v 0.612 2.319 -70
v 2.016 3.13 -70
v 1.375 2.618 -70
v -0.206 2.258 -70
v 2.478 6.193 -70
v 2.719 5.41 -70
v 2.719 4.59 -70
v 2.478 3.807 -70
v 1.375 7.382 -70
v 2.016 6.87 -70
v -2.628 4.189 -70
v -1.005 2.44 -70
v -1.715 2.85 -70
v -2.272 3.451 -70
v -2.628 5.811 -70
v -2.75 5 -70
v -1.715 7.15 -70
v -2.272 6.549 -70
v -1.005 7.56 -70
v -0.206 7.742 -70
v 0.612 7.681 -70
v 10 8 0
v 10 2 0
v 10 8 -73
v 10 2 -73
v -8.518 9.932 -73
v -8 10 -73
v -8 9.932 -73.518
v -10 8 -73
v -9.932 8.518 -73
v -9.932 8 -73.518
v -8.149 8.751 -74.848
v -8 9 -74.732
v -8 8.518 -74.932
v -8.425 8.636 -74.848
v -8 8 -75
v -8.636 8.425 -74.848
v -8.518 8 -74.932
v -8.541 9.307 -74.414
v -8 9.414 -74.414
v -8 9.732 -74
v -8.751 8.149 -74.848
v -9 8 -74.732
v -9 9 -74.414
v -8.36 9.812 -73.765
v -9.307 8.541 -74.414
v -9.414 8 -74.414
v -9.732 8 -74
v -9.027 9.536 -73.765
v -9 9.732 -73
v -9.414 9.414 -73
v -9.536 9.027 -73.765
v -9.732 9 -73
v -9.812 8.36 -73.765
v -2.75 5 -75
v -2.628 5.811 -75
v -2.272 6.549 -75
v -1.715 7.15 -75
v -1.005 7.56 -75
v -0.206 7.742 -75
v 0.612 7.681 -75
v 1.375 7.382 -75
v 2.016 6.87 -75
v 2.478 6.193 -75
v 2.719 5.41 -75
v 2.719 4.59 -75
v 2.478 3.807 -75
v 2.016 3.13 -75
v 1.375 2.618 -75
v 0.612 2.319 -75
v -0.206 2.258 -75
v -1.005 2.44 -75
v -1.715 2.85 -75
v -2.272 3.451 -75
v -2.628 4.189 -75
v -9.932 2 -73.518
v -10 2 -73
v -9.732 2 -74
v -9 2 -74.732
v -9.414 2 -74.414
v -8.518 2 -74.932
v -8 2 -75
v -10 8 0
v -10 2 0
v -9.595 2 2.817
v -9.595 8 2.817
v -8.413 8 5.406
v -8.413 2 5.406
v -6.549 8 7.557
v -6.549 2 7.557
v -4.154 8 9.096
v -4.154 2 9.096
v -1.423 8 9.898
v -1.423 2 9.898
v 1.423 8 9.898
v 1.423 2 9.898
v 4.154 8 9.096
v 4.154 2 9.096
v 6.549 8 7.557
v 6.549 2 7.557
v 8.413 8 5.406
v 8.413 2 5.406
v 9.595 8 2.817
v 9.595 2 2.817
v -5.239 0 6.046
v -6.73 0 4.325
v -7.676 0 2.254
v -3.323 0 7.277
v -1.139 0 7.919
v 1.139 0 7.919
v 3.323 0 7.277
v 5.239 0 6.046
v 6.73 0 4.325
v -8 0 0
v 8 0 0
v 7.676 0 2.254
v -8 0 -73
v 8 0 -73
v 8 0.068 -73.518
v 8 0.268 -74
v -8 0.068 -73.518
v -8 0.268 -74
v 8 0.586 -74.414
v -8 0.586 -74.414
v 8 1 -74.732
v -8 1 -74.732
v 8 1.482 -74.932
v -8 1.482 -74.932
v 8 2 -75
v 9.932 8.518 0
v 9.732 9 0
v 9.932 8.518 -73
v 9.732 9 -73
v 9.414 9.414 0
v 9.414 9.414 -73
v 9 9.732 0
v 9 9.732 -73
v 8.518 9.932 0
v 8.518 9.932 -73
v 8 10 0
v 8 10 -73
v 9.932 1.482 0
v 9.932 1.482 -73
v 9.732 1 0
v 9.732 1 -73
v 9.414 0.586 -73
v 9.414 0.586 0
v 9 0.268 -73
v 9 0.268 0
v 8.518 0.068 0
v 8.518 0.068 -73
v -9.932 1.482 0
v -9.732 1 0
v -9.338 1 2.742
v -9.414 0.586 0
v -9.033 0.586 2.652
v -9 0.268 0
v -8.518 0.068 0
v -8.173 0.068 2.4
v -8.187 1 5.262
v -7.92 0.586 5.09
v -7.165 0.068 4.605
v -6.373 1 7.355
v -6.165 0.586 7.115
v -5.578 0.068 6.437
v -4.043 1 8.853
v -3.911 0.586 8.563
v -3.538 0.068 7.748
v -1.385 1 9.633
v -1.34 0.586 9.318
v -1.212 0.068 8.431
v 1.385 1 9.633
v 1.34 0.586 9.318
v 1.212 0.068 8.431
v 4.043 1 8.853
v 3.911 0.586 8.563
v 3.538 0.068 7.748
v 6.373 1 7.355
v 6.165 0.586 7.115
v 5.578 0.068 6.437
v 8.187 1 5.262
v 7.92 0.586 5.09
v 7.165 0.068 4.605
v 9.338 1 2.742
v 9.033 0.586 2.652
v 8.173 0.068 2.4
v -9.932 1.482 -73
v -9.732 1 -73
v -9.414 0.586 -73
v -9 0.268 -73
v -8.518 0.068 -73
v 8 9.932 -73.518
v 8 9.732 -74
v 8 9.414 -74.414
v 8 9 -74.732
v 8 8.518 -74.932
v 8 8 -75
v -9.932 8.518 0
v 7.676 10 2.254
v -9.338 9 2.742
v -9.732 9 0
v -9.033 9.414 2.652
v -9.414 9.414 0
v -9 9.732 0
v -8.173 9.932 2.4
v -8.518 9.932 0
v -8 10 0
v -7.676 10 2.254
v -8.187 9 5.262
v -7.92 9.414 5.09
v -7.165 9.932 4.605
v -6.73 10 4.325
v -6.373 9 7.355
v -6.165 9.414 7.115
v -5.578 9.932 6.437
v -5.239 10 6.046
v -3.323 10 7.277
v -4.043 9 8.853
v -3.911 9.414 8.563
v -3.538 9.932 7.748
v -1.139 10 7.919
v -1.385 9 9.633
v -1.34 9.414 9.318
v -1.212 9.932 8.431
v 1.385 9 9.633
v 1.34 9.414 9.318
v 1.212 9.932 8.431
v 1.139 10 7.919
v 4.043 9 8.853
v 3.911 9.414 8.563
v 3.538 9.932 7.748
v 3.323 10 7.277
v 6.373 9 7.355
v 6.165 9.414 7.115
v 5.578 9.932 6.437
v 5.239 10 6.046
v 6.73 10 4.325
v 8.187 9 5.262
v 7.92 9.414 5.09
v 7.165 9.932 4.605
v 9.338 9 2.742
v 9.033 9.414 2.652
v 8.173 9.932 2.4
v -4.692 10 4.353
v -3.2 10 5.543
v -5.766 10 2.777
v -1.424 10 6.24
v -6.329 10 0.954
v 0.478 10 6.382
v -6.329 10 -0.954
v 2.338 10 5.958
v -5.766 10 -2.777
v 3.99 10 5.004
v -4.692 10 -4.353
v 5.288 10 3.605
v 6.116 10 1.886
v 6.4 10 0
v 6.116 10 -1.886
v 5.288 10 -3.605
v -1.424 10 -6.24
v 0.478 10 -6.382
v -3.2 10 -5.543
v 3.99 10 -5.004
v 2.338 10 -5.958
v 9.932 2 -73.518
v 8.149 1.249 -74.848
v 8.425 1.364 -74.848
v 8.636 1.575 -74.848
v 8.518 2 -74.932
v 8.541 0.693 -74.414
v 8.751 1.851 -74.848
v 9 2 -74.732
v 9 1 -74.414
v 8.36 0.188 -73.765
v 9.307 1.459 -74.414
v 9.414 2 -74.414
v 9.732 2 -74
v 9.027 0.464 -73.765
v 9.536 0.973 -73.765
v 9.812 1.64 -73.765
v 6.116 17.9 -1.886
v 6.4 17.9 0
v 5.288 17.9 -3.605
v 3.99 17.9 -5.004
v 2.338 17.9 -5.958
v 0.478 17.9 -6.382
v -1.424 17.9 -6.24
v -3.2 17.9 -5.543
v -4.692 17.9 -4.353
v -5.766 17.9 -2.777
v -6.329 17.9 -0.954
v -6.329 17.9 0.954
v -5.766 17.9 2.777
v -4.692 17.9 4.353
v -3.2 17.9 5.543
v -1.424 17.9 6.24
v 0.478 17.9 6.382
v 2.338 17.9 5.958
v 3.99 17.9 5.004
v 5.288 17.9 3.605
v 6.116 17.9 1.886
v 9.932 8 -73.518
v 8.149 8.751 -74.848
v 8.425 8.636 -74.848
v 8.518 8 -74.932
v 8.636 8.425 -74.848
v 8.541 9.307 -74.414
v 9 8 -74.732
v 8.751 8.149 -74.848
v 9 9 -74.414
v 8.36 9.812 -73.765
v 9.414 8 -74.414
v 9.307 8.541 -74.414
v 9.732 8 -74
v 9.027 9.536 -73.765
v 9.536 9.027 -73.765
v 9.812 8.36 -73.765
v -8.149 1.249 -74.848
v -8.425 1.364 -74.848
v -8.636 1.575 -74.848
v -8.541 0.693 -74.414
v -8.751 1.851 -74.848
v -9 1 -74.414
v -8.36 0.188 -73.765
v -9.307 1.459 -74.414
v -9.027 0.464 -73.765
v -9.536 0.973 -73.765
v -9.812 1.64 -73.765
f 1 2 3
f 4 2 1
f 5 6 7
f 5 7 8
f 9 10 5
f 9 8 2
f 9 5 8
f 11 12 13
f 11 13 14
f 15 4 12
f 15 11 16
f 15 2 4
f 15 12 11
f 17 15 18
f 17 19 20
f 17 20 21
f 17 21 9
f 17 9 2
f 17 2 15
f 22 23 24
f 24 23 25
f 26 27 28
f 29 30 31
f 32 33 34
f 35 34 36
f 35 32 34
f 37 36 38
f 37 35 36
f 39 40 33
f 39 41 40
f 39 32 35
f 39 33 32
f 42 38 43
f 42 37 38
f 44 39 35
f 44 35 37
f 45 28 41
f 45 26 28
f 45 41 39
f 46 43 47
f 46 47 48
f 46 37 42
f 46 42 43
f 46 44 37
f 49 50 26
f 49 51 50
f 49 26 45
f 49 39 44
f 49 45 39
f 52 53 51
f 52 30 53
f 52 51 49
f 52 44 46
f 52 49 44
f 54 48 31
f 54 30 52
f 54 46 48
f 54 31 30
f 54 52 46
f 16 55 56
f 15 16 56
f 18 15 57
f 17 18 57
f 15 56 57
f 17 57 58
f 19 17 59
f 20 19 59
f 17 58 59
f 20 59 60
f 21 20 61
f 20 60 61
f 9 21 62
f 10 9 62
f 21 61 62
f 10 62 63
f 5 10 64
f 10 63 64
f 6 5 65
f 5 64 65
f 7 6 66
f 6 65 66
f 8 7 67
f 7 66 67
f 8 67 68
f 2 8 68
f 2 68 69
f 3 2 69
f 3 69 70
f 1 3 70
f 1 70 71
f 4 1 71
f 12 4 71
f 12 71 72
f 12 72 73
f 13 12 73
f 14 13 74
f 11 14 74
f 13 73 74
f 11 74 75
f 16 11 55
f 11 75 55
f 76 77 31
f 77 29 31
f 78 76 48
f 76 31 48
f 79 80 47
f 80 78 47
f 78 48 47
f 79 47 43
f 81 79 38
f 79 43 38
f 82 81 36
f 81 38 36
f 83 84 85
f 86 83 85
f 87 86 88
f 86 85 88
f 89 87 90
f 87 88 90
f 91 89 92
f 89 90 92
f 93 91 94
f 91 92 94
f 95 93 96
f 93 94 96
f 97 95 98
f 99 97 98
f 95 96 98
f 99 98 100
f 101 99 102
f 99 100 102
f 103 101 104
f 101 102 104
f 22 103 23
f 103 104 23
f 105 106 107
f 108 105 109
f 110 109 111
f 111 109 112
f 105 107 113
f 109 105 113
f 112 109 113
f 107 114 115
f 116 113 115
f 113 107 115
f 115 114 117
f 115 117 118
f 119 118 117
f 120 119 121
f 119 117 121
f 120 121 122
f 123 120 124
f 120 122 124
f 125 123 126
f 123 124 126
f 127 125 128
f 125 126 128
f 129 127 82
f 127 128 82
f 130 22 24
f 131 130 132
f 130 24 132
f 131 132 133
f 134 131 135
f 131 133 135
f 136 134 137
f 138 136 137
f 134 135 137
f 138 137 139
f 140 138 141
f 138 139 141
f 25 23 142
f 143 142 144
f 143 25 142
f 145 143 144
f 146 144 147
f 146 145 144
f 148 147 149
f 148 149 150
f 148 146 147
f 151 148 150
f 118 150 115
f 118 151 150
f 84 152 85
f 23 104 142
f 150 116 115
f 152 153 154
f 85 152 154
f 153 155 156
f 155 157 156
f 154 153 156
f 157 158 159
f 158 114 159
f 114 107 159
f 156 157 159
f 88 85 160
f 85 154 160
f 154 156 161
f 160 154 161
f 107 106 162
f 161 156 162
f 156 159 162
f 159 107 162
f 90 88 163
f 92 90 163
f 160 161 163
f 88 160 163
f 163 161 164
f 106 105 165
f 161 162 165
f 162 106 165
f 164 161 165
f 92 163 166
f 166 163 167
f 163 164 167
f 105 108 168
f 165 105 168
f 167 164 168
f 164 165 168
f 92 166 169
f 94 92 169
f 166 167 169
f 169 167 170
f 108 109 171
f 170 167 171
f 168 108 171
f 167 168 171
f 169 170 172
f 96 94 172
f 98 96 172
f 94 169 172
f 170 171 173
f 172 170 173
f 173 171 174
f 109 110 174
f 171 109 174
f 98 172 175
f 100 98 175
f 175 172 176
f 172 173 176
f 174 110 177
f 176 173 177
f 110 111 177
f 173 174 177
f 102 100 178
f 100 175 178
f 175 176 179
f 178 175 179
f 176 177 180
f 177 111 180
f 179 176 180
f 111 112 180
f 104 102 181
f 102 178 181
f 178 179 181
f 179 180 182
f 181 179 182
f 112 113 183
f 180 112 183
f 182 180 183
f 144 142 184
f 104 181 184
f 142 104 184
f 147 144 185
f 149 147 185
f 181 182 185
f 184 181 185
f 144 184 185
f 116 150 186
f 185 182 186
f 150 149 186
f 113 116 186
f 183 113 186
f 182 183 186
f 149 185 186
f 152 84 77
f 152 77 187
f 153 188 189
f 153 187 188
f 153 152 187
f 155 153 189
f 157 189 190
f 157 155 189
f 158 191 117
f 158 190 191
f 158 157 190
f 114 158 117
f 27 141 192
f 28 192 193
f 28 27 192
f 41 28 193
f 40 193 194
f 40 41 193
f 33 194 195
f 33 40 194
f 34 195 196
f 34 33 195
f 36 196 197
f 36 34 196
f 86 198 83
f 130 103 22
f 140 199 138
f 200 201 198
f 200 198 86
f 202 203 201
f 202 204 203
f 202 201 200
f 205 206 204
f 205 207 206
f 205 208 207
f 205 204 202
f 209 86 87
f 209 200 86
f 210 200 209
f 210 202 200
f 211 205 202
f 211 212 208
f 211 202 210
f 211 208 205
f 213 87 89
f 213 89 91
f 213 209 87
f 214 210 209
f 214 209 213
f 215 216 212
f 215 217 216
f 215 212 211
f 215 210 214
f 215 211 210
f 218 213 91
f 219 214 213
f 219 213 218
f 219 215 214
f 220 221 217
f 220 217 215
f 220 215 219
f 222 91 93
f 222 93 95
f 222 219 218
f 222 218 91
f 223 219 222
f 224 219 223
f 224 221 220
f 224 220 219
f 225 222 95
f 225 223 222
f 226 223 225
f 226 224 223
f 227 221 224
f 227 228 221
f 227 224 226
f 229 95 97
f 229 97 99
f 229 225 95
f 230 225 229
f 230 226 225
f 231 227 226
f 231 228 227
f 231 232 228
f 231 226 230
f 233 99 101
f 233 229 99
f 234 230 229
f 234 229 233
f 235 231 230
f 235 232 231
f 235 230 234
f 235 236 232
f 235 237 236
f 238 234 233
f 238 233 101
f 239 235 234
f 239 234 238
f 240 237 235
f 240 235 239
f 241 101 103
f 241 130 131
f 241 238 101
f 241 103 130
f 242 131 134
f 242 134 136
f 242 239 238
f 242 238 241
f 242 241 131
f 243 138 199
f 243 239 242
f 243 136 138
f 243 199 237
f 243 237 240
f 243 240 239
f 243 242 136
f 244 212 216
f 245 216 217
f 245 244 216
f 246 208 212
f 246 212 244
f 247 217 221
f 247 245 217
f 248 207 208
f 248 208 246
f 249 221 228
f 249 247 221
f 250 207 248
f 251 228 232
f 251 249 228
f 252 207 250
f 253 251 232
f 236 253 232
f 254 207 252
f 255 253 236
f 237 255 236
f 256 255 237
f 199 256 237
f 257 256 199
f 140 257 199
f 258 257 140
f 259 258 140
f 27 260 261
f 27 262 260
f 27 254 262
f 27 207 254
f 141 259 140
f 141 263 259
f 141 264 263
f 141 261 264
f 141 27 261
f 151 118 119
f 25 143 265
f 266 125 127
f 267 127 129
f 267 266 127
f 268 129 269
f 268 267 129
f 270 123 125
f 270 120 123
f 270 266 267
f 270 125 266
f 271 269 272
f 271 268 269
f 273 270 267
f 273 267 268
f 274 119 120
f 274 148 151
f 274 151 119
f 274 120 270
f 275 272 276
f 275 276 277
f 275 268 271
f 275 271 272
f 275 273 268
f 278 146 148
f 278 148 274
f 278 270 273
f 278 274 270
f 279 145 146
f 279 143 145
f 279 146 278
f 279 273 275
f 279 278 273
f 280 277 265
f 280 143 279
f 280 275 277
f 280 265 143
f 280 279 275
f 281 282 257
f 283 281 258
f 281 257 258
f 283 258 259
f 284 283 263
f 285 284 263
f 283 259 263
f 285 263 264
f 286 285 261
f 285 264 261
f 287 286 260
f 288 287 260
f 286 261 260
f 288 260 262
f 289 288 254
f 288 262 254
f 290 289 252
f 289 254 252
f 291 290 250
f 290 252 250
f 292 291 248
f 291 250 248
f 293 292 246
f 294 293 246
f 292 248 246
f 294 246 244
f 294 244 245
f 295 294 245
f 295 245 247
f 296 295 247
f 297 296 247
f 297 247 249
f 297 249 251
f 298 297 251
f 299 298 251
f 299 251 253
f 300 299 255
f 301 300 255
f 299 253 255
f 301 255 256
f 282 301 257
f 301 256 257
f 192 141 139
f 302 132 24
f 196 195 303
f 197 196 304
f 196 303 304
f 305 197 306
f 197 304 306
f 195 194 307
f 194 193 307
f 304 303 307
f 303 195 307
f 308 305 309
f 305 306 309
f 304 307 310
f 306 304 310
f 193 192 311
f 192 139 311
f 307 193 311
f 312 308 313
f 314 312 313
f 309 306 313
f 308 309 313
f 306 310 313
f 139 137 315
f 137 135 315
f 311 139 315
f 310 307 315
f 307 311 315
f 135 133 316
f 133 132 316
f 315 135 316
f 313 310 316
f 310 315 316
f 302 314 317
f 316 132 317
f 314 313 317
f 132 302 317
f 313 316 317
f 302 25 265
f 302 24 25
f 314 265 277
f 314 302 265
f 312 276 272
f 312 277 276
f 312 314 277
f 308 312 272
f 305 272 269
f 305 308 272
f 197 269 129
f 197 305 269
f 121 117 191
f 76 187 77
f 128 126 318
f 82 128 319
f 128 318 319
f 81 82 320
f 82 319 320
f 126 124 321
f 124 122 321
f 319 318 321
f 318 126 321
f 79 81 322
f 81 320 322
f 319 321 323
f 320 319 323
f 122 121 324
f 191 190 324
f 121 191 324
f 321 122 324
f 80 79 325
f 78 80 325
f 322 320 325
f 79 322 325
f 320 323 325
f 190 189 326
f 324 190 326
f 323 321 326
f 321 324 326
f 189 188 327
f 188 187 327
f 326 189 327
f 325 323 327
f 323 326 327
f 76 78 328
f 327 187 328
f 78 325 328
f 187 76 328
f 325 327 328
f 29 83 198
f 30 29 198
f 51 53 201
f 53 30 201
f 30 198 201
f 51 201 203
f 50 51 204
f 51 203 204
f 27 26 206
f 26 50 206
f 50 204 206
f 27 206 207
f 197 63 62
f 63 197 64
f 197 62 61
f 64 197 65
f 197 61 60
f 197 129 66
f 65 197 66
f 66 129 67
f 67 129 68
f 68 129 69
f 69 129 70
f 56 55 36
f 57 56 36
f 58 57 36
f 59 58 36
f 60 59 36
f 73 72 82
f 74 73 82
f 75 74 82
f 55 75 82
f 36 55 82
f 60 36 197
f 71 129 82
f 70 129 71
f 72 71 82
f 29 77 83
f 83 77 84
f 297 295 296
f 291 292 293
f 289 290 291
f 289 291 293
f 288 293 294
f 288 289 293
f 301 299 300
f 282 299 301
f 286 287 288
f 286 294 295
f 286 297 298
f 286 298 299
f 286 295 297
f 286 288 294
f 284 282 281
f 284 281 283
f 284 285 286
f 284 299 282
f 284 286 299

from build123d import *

# Parameters (mm, degrees)
SKETCH2_R           = 10
BOSS_EXTRUDE2_DEPTH = 10
SKETCH3_R           = 6.4
BOSS_EXTRUDE3_DEPTH = 7.9
SKETCH4_R           = 2.75
CUT_EXTRUDE1_DEPTH  = 5
FILLET1_R           = 2


with BuildPart() as part:
    # Sketch2 → Boss-Extrude2 (new body)
    with BuildSketch(Plane(origin=(0, 0, 0), x_dir=(1, 0, 0), z_dir=(0, 1, 0))):
        Circle(SKETCH2_R)
        with BuildLine():
            Line((-10, 75), (-10, 0))
            ThreePointArc((-10, 0), (0, 10), (10, 0))
            Line((10, 0), (10, 75))
            Line((10, 75), (-10, 75))
        make_face()
    extrude(amount=BOSS_EXTRUDE2_DEPTH)

    # Sketch3 → Boss-Extrude3 (add)
    with BuildSketch(Plane(origin=(0, 10, 0), x_dir=(1, 0, 0), z_dir=(0, 1, 0))):
        Circle(SKETCH3_R)
    extrude(amount=BOSS_EXTRUDE3_DEPTH)

    # Sketch4 → Cut-Extrude1 (cut)
    with BuildSketch(Plane(origin=(0, 0, -75), x_dir=(-1, 0, 0), z_dir=(0, 0, -1))):
        with Locations((0, 5)):
            Circle(SKETCH4_R)
    extrude(amount=-CUT_EXTRUDE1_DEPTH, mode=Mode.SUBTRACT)

    # Fillet1
    fillet1_edges = [part.edges().sort_by_distance(p)[0] for p in [
        (10, 10, -37.5),
        (0, 10, -75),
        (-10, 10, -37.5),
        (0, 10, 10),
        (-10, 0, -37.5),
        (0, 0, -75),
        (10, 0, -37.5),
        (0, 0, 10),
        (-10, 5, -75),
        (10, 5, -75),
    ]]
    fillet(fillet1_edges, radius=FILLET1_R)


solid = part.part
